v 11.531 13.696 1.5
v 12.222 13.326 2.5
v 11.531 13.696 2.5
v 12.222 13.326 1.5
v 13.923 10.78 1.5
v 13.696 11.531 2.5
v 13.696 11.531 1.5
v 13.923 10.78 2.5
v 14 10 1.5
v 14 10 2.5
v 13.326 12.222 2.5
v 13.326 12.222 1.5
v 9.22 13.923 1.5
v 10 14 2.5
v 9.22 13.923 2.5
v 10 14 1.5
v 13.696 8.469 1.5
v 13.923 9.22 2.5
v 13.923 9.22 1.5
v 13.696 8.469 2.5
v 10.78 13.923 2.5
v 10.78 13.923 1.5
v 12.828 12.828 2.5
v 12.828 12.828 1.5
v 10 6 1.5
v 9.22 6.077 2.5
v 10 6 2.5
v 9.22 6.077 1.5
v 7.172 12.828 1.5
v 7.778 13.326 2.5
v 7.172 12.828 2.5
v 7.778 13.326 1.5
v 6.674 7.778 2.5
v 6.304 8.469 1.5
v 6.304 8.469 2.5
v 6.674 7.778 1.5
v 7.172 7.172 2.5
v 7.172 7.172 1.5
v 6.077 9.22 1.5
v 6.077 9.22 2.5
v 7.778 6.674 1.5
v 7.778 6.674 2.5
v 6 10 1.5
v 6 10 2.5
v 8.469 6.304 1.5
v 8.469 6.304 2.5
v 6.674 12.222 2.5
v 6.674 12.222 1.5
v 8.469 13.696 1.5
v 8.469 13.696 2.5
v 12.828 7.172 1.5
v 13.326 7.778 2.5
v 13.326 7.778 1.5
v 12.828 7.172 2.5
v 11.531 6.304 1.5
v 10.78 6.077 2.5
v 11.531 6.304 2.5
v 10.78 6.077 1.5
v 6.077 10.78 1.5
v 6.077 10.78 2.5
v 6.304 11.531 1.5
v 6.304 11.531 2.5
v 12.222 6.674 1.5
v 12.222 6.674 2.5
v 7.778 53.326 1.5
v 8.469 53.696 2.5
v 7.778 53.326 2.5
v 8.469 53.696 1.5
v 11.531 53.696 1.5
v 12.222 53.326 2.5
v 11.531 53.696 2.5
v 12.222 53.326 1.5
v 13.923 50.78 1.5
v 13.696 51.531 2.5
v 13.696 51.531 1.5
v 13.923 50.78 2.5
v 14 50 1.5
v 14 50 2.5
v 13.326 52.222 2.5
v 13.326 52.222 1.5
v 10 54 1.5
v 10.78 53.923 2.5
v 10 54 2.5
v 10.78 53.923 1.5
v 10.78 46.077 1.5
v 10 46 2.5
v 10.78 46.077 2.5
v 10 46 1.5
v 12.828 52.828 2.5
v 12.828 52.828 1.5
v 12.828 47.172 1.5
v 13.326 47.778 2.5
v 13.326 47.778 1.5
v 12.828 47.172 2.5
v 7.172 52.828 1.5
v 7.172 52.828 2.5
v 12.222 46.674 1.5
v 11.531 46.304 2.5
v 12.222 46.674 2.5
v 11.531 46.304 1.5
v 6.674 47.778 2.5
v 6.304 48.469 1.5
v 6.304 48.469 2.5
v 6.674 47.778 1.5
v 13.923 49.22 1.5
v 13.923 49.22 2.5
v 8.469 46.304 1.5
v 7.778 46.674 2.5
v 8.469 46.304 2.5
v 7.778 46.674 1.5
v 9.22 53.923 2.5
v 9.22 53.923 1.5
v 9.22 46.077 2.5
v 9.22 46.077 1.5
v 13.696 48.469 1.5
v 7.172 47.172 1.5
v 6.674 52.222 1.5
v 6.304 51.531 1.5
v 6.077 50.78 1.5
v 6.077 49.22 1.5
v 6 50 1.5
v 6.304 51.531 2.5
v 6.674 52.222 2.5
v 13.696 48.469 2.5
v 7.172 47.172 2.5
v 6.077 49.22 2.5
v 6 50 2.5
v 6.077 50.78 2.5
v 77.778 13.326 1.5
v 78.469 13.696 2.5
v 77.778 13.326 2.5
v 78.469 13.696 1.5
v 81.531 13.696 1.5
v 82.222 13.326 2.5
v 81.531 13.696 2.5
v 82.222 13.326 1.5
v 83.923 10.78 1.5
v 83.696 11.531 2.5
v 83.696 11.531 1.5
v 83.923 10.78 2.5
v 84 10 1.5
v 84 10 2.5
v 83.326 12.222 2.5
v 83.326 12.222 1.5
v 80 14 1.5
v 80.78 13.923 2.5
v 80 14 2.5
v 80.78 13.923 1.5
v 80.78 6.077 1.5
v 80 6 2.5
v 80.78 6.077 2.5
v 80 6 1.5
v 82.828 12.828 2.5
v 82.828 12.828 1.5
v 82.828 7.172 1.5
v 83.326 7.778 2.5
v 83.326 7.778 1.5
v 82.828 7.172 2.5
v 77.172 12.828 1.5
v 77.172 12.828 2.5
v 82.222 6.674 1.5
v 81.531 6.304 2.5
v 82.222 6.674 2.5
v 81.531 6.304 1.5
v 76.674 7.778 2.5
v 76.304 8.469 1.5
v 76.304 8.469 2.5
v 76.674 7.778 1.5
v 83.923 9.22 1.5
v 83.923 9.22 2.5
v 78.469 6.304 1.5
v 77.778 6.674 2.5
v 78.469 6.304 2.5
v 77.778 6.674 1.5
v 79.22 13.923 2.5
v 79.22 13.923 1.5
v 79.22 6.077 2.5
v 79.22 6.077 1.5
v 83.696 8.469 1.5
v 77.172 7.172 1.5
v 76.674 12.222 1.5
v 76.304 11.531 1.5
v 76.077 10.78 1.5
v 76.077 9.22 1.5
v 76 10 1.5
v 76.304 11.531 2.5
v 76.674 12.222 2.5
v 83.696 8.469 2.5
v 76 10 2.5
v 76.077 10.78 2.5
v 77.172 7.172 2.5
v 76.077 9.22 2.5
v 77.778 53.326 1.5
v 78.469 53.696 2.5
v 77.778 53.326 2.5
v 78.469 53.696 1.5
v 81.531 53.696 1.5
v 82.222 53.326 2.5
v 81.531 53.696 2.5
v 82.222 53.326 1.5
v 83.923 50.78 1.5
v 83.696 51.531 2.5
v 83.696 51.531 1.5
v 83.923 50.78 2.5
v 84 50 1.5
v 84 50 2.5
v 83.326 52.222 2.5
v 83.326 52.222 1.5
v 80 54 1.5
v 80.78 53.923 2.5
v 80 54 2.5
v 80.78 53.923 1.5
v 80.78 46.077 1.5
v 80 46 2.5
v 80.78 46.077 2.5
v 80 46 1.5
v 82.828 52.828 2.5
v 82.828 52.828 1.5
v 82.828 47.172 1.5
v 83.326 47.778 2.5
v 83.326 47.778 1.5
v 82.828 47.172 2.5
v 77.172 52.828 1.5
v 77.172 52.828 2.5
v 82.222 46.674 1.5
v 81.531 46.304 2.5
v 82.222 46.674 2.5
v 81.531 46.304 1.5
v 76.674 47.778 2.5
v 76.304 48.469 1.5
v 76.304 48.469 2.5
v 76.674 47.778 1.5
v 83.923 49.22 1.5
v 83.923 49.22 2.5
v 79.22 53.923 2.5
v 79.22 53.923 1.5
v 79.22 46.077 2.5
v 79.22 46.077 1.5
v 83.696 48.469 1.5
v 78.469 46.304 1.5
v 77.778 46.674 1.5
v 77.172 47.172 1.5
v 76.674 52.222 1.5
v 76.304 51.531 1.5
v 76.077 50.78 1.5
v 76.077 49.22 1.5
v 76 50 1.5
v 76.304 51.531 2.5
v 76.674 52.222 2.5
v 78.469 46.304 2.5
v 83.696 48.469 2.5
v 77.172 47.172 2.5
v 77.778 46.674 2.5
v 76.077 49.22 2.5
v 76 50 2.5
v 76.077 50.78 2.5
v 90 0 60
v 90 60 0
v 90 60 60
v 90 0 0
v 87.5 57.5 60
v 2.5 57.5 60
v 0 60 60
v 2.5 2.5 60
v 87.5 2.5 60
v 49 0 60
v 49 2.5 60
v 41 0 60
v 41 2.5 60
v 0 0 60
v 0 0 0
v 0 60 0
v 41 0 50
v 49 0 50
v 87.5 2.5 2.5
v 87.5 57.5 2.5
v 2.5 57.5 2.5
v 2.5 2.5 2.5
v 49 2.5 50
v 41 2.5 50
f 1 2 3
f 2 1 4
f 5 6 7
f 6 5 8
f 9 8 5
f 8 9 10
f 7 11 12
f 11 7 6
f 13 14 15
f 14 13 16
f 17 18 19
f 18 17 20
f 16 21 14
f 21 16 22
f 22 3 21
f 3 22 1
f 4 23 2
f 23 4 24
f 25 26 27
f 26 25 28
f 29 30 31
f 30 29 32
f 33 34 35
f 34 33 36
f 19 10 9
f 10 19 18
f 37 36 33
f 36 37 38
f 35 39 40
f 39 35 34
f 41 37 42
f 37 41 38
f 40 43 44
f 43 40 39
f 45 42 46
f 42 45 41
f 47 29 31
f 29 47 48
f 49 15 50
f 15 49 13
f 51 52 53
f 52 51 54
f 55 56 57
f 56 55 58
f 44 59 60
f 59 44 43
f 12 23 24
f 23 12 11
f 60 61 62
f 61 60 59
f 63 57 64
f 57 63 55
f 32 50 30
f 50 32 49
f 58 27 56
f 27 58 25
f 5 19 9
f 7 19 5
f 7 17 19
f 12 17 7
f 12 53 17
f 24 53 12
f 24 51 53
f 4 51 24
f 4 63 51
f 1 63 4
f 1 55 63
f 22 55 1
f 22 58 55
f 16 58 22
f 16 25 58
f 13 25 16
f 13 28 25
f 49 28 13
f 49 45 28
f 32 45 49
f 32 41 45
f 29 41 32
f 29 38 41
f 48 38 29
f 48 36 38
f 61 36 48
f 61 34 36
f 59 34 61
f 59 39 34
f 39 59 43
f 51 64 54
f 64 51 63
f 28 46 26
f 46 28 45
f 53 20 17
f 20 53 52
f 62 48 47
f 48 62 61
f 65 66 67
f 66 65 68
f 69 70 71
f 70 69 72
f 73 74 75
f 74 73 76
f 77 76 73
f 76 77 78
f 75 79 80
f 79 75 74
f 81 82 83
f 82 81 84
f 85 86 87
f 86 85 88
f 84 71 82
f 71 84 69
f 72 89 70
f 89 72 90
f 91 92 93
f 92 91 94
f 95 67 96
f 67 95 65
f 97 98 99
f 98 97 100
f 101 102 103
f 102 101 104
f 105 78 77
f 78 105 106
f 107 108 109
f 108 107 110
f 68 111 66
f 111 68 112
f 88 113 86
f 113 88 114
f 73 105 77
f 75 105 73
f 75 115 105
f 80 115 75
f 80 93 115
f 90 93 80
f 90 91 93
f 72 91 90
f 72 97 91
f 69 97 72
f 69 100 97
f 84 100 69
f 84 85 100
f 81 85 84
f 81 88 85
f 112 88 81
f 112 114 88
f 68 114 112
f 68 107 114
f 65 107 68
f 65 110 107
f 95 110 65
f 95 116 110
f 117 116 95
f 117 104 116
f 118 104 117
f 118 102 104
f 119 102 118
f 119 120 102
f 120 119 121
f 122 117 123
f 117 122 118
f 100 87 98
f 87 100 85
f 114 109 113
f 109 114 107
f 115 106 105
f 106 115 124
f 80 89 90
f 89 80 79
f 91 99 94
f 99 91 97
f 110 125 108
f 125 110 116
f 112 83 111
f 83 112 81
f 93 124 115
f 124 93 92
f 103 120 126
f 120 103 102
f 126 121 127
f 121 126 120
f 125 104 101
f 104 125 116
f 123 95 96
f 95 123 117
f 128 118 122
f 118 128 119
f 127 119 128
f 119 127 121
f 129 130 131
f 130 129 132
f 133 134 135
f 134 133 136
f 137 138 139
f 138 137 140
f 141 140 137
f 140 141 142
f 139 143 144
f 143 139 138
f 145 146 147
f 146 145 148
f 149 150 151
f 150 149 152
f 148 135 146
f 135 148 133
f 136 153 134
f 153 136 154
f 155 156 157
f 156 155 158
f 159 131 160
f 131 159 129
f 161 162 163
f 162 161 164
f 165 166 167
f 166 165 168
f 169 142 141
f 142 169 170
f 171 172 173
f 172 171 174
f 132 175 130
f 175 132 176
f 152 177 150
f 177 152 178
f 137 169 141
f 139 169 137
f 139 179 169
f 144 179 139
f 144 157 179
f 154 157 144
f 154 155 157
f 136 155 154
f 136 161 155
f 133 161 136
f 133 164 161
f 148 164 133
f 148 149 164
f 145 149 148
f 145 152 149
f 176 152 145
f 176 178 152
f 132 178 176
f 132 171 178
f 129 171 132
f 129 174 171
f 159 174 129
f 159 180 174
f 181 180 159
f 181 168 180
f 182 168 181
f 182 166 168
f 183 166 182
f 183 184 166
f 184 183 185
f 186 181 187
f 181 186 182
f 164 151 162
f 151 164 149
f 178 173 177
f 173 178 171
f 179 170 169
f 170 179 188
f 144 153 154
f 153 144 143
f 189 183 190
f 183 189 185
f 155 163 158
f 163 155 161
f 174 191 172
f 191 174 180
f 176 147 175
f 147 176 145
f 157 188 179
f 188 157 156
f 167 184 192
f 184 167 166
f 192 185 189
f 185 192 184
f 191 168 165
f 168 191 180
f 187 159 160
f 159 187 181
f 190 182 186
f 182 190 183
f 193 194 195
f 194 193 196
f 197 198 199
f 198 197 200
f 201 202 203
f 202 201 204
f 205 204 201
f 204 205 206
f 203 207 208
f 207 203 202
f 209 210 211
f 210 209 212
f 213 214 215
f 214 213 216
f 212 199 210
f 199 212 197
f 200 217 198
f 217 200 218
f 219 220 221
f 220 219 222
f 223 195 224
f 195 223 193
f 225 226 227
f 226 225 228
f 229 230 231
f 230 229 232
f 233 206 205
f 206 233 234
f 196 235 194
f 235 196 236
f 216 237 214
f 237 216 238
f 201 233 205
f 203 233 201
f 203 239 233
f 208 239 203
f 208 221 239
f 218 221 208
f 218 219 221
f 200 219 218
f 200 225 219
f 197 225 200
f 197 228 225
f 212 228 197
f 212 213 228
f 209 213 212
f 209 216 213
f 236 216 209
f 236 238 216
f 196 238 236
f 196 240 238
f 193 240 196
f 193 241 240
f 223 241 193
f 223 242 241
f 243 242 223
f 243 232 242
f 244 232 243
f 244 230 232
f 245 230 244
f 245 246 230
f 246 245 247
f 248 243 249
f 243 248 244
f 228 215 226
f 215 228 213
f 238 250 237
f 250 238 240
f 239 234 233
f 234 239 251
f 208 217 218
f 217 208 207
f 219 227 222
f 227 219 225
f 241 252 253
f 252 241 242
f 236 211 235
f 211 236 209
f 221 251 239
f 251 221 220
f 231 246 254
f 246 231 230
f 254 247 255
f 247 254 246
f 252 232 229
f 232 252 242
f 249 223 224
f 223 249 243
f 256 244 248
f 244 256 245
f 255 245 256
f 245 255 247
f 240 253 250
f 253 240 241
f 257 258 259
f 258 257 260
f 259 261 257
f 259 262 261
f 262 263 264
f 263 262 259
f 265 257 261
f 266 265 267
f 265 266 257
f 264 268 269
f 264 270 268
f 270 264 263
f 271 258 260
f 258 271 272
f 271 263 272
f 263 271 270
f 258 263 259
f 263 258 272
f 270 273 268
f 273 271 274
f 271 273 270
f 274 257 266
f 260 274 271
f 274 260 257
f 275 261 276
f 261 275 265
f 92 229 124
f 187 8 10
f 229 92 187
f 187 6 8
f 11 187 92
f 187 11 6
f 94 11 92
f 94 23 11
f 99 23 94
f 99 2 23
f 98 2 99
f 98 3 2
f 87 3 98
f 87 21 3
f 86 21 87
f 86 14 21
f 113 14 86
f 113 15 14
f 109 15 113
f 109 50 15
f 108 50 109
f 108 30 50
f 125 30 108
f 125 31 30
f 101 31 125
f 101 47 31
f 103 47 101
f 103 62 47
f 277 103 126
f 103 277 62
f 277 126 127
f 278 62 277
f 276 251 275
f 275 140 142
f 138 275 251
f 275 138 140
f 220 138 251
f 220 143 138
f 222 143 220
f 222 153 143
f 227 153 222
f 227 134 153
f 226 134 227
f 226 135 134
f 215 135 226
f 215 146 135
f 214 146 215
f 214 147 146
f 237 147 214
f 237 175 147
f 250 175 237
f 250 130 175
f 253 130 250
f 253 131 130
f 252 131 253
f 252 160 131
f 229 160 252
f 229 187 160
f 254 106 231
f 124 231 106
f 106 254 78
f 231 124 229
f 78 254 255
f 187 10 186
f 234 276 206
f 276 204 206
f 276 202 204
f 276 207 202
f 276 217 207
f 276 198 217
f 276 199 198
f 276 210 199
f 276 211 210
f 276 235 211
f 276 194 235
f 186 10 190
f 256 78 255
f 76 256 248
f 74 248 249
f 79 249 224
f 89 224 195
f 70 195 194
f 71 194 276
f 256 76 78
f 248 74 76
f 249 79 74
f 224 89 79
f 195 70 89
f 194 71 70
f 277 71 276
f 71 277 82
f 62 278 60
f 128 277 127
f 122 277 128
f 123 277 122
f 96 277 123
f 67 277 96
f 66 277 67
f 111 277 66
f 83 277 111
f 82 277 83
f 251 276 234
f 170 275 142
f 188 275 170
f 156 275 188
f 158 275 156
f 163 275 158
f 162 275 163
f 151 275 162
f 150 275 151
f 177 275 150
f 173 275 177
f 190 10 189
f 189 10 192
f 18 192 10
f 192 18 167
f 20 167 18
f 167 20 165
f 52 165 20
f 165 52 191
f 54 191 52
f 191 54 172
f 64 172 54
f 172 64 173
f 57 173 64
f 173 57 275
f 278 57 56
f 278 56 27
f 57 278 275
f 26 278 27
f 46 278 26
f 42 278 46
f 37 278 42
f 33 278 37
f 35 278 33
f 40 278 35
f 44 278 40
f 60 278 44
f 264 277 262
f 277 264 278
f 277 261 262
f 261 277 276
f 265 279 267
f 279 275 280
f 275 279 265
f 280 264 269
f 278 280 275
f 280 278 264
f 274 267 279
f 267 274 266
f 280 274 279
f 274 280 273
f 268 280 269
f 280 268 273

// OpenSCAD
$fn = 32;

// ----------------------------------------------------------------------
// Enclosure box: both enclosure
// ----------------------------------------------------------------------

// --- parameters (mm) ---
box_l = 90;               // outer length, X
box_w = 60;               // outer width, Y
box_h = 60;               // outer height
wall_t = 2.5;             // wall thickness
boss_r = 4;               // corner boss radius
hole_r = 2;               // boss screw hole radius
boss_in = 10;             // boss inset from the corners
notch_w = 8;              // cable notch width
notch_h = 10;             // cable notch height

inner_h = box_h - wall_t;  // cavity depth
boss_h = inner_h - 2;  // corner boss height

difference() {
  cube([box_l, box_w, box_h]);
  translate([wall_t, wall_t, wall_t])
    cube([box_l - 2 * wall_t, box_w - 2 * wall_t, box_h]);
  for (sx = [0, 1], sy = [0, 1])
    translate([sx ? box_l - boss_in : boss_in,
               sy ? box_w - boss_in : boss_in, wall_t - 1]) {
      cylinder(r = boss_r, h = boss_h);
      translate([0, 0, boss_h - 4])
        cylinder(r = hole_r, h = 5);
    }
  translate([box_l / 2 - notch_w / 2, -1, box_h - notch_h])
    cube([notch_w, wall_t + 2, notch_h + 1]);
}
